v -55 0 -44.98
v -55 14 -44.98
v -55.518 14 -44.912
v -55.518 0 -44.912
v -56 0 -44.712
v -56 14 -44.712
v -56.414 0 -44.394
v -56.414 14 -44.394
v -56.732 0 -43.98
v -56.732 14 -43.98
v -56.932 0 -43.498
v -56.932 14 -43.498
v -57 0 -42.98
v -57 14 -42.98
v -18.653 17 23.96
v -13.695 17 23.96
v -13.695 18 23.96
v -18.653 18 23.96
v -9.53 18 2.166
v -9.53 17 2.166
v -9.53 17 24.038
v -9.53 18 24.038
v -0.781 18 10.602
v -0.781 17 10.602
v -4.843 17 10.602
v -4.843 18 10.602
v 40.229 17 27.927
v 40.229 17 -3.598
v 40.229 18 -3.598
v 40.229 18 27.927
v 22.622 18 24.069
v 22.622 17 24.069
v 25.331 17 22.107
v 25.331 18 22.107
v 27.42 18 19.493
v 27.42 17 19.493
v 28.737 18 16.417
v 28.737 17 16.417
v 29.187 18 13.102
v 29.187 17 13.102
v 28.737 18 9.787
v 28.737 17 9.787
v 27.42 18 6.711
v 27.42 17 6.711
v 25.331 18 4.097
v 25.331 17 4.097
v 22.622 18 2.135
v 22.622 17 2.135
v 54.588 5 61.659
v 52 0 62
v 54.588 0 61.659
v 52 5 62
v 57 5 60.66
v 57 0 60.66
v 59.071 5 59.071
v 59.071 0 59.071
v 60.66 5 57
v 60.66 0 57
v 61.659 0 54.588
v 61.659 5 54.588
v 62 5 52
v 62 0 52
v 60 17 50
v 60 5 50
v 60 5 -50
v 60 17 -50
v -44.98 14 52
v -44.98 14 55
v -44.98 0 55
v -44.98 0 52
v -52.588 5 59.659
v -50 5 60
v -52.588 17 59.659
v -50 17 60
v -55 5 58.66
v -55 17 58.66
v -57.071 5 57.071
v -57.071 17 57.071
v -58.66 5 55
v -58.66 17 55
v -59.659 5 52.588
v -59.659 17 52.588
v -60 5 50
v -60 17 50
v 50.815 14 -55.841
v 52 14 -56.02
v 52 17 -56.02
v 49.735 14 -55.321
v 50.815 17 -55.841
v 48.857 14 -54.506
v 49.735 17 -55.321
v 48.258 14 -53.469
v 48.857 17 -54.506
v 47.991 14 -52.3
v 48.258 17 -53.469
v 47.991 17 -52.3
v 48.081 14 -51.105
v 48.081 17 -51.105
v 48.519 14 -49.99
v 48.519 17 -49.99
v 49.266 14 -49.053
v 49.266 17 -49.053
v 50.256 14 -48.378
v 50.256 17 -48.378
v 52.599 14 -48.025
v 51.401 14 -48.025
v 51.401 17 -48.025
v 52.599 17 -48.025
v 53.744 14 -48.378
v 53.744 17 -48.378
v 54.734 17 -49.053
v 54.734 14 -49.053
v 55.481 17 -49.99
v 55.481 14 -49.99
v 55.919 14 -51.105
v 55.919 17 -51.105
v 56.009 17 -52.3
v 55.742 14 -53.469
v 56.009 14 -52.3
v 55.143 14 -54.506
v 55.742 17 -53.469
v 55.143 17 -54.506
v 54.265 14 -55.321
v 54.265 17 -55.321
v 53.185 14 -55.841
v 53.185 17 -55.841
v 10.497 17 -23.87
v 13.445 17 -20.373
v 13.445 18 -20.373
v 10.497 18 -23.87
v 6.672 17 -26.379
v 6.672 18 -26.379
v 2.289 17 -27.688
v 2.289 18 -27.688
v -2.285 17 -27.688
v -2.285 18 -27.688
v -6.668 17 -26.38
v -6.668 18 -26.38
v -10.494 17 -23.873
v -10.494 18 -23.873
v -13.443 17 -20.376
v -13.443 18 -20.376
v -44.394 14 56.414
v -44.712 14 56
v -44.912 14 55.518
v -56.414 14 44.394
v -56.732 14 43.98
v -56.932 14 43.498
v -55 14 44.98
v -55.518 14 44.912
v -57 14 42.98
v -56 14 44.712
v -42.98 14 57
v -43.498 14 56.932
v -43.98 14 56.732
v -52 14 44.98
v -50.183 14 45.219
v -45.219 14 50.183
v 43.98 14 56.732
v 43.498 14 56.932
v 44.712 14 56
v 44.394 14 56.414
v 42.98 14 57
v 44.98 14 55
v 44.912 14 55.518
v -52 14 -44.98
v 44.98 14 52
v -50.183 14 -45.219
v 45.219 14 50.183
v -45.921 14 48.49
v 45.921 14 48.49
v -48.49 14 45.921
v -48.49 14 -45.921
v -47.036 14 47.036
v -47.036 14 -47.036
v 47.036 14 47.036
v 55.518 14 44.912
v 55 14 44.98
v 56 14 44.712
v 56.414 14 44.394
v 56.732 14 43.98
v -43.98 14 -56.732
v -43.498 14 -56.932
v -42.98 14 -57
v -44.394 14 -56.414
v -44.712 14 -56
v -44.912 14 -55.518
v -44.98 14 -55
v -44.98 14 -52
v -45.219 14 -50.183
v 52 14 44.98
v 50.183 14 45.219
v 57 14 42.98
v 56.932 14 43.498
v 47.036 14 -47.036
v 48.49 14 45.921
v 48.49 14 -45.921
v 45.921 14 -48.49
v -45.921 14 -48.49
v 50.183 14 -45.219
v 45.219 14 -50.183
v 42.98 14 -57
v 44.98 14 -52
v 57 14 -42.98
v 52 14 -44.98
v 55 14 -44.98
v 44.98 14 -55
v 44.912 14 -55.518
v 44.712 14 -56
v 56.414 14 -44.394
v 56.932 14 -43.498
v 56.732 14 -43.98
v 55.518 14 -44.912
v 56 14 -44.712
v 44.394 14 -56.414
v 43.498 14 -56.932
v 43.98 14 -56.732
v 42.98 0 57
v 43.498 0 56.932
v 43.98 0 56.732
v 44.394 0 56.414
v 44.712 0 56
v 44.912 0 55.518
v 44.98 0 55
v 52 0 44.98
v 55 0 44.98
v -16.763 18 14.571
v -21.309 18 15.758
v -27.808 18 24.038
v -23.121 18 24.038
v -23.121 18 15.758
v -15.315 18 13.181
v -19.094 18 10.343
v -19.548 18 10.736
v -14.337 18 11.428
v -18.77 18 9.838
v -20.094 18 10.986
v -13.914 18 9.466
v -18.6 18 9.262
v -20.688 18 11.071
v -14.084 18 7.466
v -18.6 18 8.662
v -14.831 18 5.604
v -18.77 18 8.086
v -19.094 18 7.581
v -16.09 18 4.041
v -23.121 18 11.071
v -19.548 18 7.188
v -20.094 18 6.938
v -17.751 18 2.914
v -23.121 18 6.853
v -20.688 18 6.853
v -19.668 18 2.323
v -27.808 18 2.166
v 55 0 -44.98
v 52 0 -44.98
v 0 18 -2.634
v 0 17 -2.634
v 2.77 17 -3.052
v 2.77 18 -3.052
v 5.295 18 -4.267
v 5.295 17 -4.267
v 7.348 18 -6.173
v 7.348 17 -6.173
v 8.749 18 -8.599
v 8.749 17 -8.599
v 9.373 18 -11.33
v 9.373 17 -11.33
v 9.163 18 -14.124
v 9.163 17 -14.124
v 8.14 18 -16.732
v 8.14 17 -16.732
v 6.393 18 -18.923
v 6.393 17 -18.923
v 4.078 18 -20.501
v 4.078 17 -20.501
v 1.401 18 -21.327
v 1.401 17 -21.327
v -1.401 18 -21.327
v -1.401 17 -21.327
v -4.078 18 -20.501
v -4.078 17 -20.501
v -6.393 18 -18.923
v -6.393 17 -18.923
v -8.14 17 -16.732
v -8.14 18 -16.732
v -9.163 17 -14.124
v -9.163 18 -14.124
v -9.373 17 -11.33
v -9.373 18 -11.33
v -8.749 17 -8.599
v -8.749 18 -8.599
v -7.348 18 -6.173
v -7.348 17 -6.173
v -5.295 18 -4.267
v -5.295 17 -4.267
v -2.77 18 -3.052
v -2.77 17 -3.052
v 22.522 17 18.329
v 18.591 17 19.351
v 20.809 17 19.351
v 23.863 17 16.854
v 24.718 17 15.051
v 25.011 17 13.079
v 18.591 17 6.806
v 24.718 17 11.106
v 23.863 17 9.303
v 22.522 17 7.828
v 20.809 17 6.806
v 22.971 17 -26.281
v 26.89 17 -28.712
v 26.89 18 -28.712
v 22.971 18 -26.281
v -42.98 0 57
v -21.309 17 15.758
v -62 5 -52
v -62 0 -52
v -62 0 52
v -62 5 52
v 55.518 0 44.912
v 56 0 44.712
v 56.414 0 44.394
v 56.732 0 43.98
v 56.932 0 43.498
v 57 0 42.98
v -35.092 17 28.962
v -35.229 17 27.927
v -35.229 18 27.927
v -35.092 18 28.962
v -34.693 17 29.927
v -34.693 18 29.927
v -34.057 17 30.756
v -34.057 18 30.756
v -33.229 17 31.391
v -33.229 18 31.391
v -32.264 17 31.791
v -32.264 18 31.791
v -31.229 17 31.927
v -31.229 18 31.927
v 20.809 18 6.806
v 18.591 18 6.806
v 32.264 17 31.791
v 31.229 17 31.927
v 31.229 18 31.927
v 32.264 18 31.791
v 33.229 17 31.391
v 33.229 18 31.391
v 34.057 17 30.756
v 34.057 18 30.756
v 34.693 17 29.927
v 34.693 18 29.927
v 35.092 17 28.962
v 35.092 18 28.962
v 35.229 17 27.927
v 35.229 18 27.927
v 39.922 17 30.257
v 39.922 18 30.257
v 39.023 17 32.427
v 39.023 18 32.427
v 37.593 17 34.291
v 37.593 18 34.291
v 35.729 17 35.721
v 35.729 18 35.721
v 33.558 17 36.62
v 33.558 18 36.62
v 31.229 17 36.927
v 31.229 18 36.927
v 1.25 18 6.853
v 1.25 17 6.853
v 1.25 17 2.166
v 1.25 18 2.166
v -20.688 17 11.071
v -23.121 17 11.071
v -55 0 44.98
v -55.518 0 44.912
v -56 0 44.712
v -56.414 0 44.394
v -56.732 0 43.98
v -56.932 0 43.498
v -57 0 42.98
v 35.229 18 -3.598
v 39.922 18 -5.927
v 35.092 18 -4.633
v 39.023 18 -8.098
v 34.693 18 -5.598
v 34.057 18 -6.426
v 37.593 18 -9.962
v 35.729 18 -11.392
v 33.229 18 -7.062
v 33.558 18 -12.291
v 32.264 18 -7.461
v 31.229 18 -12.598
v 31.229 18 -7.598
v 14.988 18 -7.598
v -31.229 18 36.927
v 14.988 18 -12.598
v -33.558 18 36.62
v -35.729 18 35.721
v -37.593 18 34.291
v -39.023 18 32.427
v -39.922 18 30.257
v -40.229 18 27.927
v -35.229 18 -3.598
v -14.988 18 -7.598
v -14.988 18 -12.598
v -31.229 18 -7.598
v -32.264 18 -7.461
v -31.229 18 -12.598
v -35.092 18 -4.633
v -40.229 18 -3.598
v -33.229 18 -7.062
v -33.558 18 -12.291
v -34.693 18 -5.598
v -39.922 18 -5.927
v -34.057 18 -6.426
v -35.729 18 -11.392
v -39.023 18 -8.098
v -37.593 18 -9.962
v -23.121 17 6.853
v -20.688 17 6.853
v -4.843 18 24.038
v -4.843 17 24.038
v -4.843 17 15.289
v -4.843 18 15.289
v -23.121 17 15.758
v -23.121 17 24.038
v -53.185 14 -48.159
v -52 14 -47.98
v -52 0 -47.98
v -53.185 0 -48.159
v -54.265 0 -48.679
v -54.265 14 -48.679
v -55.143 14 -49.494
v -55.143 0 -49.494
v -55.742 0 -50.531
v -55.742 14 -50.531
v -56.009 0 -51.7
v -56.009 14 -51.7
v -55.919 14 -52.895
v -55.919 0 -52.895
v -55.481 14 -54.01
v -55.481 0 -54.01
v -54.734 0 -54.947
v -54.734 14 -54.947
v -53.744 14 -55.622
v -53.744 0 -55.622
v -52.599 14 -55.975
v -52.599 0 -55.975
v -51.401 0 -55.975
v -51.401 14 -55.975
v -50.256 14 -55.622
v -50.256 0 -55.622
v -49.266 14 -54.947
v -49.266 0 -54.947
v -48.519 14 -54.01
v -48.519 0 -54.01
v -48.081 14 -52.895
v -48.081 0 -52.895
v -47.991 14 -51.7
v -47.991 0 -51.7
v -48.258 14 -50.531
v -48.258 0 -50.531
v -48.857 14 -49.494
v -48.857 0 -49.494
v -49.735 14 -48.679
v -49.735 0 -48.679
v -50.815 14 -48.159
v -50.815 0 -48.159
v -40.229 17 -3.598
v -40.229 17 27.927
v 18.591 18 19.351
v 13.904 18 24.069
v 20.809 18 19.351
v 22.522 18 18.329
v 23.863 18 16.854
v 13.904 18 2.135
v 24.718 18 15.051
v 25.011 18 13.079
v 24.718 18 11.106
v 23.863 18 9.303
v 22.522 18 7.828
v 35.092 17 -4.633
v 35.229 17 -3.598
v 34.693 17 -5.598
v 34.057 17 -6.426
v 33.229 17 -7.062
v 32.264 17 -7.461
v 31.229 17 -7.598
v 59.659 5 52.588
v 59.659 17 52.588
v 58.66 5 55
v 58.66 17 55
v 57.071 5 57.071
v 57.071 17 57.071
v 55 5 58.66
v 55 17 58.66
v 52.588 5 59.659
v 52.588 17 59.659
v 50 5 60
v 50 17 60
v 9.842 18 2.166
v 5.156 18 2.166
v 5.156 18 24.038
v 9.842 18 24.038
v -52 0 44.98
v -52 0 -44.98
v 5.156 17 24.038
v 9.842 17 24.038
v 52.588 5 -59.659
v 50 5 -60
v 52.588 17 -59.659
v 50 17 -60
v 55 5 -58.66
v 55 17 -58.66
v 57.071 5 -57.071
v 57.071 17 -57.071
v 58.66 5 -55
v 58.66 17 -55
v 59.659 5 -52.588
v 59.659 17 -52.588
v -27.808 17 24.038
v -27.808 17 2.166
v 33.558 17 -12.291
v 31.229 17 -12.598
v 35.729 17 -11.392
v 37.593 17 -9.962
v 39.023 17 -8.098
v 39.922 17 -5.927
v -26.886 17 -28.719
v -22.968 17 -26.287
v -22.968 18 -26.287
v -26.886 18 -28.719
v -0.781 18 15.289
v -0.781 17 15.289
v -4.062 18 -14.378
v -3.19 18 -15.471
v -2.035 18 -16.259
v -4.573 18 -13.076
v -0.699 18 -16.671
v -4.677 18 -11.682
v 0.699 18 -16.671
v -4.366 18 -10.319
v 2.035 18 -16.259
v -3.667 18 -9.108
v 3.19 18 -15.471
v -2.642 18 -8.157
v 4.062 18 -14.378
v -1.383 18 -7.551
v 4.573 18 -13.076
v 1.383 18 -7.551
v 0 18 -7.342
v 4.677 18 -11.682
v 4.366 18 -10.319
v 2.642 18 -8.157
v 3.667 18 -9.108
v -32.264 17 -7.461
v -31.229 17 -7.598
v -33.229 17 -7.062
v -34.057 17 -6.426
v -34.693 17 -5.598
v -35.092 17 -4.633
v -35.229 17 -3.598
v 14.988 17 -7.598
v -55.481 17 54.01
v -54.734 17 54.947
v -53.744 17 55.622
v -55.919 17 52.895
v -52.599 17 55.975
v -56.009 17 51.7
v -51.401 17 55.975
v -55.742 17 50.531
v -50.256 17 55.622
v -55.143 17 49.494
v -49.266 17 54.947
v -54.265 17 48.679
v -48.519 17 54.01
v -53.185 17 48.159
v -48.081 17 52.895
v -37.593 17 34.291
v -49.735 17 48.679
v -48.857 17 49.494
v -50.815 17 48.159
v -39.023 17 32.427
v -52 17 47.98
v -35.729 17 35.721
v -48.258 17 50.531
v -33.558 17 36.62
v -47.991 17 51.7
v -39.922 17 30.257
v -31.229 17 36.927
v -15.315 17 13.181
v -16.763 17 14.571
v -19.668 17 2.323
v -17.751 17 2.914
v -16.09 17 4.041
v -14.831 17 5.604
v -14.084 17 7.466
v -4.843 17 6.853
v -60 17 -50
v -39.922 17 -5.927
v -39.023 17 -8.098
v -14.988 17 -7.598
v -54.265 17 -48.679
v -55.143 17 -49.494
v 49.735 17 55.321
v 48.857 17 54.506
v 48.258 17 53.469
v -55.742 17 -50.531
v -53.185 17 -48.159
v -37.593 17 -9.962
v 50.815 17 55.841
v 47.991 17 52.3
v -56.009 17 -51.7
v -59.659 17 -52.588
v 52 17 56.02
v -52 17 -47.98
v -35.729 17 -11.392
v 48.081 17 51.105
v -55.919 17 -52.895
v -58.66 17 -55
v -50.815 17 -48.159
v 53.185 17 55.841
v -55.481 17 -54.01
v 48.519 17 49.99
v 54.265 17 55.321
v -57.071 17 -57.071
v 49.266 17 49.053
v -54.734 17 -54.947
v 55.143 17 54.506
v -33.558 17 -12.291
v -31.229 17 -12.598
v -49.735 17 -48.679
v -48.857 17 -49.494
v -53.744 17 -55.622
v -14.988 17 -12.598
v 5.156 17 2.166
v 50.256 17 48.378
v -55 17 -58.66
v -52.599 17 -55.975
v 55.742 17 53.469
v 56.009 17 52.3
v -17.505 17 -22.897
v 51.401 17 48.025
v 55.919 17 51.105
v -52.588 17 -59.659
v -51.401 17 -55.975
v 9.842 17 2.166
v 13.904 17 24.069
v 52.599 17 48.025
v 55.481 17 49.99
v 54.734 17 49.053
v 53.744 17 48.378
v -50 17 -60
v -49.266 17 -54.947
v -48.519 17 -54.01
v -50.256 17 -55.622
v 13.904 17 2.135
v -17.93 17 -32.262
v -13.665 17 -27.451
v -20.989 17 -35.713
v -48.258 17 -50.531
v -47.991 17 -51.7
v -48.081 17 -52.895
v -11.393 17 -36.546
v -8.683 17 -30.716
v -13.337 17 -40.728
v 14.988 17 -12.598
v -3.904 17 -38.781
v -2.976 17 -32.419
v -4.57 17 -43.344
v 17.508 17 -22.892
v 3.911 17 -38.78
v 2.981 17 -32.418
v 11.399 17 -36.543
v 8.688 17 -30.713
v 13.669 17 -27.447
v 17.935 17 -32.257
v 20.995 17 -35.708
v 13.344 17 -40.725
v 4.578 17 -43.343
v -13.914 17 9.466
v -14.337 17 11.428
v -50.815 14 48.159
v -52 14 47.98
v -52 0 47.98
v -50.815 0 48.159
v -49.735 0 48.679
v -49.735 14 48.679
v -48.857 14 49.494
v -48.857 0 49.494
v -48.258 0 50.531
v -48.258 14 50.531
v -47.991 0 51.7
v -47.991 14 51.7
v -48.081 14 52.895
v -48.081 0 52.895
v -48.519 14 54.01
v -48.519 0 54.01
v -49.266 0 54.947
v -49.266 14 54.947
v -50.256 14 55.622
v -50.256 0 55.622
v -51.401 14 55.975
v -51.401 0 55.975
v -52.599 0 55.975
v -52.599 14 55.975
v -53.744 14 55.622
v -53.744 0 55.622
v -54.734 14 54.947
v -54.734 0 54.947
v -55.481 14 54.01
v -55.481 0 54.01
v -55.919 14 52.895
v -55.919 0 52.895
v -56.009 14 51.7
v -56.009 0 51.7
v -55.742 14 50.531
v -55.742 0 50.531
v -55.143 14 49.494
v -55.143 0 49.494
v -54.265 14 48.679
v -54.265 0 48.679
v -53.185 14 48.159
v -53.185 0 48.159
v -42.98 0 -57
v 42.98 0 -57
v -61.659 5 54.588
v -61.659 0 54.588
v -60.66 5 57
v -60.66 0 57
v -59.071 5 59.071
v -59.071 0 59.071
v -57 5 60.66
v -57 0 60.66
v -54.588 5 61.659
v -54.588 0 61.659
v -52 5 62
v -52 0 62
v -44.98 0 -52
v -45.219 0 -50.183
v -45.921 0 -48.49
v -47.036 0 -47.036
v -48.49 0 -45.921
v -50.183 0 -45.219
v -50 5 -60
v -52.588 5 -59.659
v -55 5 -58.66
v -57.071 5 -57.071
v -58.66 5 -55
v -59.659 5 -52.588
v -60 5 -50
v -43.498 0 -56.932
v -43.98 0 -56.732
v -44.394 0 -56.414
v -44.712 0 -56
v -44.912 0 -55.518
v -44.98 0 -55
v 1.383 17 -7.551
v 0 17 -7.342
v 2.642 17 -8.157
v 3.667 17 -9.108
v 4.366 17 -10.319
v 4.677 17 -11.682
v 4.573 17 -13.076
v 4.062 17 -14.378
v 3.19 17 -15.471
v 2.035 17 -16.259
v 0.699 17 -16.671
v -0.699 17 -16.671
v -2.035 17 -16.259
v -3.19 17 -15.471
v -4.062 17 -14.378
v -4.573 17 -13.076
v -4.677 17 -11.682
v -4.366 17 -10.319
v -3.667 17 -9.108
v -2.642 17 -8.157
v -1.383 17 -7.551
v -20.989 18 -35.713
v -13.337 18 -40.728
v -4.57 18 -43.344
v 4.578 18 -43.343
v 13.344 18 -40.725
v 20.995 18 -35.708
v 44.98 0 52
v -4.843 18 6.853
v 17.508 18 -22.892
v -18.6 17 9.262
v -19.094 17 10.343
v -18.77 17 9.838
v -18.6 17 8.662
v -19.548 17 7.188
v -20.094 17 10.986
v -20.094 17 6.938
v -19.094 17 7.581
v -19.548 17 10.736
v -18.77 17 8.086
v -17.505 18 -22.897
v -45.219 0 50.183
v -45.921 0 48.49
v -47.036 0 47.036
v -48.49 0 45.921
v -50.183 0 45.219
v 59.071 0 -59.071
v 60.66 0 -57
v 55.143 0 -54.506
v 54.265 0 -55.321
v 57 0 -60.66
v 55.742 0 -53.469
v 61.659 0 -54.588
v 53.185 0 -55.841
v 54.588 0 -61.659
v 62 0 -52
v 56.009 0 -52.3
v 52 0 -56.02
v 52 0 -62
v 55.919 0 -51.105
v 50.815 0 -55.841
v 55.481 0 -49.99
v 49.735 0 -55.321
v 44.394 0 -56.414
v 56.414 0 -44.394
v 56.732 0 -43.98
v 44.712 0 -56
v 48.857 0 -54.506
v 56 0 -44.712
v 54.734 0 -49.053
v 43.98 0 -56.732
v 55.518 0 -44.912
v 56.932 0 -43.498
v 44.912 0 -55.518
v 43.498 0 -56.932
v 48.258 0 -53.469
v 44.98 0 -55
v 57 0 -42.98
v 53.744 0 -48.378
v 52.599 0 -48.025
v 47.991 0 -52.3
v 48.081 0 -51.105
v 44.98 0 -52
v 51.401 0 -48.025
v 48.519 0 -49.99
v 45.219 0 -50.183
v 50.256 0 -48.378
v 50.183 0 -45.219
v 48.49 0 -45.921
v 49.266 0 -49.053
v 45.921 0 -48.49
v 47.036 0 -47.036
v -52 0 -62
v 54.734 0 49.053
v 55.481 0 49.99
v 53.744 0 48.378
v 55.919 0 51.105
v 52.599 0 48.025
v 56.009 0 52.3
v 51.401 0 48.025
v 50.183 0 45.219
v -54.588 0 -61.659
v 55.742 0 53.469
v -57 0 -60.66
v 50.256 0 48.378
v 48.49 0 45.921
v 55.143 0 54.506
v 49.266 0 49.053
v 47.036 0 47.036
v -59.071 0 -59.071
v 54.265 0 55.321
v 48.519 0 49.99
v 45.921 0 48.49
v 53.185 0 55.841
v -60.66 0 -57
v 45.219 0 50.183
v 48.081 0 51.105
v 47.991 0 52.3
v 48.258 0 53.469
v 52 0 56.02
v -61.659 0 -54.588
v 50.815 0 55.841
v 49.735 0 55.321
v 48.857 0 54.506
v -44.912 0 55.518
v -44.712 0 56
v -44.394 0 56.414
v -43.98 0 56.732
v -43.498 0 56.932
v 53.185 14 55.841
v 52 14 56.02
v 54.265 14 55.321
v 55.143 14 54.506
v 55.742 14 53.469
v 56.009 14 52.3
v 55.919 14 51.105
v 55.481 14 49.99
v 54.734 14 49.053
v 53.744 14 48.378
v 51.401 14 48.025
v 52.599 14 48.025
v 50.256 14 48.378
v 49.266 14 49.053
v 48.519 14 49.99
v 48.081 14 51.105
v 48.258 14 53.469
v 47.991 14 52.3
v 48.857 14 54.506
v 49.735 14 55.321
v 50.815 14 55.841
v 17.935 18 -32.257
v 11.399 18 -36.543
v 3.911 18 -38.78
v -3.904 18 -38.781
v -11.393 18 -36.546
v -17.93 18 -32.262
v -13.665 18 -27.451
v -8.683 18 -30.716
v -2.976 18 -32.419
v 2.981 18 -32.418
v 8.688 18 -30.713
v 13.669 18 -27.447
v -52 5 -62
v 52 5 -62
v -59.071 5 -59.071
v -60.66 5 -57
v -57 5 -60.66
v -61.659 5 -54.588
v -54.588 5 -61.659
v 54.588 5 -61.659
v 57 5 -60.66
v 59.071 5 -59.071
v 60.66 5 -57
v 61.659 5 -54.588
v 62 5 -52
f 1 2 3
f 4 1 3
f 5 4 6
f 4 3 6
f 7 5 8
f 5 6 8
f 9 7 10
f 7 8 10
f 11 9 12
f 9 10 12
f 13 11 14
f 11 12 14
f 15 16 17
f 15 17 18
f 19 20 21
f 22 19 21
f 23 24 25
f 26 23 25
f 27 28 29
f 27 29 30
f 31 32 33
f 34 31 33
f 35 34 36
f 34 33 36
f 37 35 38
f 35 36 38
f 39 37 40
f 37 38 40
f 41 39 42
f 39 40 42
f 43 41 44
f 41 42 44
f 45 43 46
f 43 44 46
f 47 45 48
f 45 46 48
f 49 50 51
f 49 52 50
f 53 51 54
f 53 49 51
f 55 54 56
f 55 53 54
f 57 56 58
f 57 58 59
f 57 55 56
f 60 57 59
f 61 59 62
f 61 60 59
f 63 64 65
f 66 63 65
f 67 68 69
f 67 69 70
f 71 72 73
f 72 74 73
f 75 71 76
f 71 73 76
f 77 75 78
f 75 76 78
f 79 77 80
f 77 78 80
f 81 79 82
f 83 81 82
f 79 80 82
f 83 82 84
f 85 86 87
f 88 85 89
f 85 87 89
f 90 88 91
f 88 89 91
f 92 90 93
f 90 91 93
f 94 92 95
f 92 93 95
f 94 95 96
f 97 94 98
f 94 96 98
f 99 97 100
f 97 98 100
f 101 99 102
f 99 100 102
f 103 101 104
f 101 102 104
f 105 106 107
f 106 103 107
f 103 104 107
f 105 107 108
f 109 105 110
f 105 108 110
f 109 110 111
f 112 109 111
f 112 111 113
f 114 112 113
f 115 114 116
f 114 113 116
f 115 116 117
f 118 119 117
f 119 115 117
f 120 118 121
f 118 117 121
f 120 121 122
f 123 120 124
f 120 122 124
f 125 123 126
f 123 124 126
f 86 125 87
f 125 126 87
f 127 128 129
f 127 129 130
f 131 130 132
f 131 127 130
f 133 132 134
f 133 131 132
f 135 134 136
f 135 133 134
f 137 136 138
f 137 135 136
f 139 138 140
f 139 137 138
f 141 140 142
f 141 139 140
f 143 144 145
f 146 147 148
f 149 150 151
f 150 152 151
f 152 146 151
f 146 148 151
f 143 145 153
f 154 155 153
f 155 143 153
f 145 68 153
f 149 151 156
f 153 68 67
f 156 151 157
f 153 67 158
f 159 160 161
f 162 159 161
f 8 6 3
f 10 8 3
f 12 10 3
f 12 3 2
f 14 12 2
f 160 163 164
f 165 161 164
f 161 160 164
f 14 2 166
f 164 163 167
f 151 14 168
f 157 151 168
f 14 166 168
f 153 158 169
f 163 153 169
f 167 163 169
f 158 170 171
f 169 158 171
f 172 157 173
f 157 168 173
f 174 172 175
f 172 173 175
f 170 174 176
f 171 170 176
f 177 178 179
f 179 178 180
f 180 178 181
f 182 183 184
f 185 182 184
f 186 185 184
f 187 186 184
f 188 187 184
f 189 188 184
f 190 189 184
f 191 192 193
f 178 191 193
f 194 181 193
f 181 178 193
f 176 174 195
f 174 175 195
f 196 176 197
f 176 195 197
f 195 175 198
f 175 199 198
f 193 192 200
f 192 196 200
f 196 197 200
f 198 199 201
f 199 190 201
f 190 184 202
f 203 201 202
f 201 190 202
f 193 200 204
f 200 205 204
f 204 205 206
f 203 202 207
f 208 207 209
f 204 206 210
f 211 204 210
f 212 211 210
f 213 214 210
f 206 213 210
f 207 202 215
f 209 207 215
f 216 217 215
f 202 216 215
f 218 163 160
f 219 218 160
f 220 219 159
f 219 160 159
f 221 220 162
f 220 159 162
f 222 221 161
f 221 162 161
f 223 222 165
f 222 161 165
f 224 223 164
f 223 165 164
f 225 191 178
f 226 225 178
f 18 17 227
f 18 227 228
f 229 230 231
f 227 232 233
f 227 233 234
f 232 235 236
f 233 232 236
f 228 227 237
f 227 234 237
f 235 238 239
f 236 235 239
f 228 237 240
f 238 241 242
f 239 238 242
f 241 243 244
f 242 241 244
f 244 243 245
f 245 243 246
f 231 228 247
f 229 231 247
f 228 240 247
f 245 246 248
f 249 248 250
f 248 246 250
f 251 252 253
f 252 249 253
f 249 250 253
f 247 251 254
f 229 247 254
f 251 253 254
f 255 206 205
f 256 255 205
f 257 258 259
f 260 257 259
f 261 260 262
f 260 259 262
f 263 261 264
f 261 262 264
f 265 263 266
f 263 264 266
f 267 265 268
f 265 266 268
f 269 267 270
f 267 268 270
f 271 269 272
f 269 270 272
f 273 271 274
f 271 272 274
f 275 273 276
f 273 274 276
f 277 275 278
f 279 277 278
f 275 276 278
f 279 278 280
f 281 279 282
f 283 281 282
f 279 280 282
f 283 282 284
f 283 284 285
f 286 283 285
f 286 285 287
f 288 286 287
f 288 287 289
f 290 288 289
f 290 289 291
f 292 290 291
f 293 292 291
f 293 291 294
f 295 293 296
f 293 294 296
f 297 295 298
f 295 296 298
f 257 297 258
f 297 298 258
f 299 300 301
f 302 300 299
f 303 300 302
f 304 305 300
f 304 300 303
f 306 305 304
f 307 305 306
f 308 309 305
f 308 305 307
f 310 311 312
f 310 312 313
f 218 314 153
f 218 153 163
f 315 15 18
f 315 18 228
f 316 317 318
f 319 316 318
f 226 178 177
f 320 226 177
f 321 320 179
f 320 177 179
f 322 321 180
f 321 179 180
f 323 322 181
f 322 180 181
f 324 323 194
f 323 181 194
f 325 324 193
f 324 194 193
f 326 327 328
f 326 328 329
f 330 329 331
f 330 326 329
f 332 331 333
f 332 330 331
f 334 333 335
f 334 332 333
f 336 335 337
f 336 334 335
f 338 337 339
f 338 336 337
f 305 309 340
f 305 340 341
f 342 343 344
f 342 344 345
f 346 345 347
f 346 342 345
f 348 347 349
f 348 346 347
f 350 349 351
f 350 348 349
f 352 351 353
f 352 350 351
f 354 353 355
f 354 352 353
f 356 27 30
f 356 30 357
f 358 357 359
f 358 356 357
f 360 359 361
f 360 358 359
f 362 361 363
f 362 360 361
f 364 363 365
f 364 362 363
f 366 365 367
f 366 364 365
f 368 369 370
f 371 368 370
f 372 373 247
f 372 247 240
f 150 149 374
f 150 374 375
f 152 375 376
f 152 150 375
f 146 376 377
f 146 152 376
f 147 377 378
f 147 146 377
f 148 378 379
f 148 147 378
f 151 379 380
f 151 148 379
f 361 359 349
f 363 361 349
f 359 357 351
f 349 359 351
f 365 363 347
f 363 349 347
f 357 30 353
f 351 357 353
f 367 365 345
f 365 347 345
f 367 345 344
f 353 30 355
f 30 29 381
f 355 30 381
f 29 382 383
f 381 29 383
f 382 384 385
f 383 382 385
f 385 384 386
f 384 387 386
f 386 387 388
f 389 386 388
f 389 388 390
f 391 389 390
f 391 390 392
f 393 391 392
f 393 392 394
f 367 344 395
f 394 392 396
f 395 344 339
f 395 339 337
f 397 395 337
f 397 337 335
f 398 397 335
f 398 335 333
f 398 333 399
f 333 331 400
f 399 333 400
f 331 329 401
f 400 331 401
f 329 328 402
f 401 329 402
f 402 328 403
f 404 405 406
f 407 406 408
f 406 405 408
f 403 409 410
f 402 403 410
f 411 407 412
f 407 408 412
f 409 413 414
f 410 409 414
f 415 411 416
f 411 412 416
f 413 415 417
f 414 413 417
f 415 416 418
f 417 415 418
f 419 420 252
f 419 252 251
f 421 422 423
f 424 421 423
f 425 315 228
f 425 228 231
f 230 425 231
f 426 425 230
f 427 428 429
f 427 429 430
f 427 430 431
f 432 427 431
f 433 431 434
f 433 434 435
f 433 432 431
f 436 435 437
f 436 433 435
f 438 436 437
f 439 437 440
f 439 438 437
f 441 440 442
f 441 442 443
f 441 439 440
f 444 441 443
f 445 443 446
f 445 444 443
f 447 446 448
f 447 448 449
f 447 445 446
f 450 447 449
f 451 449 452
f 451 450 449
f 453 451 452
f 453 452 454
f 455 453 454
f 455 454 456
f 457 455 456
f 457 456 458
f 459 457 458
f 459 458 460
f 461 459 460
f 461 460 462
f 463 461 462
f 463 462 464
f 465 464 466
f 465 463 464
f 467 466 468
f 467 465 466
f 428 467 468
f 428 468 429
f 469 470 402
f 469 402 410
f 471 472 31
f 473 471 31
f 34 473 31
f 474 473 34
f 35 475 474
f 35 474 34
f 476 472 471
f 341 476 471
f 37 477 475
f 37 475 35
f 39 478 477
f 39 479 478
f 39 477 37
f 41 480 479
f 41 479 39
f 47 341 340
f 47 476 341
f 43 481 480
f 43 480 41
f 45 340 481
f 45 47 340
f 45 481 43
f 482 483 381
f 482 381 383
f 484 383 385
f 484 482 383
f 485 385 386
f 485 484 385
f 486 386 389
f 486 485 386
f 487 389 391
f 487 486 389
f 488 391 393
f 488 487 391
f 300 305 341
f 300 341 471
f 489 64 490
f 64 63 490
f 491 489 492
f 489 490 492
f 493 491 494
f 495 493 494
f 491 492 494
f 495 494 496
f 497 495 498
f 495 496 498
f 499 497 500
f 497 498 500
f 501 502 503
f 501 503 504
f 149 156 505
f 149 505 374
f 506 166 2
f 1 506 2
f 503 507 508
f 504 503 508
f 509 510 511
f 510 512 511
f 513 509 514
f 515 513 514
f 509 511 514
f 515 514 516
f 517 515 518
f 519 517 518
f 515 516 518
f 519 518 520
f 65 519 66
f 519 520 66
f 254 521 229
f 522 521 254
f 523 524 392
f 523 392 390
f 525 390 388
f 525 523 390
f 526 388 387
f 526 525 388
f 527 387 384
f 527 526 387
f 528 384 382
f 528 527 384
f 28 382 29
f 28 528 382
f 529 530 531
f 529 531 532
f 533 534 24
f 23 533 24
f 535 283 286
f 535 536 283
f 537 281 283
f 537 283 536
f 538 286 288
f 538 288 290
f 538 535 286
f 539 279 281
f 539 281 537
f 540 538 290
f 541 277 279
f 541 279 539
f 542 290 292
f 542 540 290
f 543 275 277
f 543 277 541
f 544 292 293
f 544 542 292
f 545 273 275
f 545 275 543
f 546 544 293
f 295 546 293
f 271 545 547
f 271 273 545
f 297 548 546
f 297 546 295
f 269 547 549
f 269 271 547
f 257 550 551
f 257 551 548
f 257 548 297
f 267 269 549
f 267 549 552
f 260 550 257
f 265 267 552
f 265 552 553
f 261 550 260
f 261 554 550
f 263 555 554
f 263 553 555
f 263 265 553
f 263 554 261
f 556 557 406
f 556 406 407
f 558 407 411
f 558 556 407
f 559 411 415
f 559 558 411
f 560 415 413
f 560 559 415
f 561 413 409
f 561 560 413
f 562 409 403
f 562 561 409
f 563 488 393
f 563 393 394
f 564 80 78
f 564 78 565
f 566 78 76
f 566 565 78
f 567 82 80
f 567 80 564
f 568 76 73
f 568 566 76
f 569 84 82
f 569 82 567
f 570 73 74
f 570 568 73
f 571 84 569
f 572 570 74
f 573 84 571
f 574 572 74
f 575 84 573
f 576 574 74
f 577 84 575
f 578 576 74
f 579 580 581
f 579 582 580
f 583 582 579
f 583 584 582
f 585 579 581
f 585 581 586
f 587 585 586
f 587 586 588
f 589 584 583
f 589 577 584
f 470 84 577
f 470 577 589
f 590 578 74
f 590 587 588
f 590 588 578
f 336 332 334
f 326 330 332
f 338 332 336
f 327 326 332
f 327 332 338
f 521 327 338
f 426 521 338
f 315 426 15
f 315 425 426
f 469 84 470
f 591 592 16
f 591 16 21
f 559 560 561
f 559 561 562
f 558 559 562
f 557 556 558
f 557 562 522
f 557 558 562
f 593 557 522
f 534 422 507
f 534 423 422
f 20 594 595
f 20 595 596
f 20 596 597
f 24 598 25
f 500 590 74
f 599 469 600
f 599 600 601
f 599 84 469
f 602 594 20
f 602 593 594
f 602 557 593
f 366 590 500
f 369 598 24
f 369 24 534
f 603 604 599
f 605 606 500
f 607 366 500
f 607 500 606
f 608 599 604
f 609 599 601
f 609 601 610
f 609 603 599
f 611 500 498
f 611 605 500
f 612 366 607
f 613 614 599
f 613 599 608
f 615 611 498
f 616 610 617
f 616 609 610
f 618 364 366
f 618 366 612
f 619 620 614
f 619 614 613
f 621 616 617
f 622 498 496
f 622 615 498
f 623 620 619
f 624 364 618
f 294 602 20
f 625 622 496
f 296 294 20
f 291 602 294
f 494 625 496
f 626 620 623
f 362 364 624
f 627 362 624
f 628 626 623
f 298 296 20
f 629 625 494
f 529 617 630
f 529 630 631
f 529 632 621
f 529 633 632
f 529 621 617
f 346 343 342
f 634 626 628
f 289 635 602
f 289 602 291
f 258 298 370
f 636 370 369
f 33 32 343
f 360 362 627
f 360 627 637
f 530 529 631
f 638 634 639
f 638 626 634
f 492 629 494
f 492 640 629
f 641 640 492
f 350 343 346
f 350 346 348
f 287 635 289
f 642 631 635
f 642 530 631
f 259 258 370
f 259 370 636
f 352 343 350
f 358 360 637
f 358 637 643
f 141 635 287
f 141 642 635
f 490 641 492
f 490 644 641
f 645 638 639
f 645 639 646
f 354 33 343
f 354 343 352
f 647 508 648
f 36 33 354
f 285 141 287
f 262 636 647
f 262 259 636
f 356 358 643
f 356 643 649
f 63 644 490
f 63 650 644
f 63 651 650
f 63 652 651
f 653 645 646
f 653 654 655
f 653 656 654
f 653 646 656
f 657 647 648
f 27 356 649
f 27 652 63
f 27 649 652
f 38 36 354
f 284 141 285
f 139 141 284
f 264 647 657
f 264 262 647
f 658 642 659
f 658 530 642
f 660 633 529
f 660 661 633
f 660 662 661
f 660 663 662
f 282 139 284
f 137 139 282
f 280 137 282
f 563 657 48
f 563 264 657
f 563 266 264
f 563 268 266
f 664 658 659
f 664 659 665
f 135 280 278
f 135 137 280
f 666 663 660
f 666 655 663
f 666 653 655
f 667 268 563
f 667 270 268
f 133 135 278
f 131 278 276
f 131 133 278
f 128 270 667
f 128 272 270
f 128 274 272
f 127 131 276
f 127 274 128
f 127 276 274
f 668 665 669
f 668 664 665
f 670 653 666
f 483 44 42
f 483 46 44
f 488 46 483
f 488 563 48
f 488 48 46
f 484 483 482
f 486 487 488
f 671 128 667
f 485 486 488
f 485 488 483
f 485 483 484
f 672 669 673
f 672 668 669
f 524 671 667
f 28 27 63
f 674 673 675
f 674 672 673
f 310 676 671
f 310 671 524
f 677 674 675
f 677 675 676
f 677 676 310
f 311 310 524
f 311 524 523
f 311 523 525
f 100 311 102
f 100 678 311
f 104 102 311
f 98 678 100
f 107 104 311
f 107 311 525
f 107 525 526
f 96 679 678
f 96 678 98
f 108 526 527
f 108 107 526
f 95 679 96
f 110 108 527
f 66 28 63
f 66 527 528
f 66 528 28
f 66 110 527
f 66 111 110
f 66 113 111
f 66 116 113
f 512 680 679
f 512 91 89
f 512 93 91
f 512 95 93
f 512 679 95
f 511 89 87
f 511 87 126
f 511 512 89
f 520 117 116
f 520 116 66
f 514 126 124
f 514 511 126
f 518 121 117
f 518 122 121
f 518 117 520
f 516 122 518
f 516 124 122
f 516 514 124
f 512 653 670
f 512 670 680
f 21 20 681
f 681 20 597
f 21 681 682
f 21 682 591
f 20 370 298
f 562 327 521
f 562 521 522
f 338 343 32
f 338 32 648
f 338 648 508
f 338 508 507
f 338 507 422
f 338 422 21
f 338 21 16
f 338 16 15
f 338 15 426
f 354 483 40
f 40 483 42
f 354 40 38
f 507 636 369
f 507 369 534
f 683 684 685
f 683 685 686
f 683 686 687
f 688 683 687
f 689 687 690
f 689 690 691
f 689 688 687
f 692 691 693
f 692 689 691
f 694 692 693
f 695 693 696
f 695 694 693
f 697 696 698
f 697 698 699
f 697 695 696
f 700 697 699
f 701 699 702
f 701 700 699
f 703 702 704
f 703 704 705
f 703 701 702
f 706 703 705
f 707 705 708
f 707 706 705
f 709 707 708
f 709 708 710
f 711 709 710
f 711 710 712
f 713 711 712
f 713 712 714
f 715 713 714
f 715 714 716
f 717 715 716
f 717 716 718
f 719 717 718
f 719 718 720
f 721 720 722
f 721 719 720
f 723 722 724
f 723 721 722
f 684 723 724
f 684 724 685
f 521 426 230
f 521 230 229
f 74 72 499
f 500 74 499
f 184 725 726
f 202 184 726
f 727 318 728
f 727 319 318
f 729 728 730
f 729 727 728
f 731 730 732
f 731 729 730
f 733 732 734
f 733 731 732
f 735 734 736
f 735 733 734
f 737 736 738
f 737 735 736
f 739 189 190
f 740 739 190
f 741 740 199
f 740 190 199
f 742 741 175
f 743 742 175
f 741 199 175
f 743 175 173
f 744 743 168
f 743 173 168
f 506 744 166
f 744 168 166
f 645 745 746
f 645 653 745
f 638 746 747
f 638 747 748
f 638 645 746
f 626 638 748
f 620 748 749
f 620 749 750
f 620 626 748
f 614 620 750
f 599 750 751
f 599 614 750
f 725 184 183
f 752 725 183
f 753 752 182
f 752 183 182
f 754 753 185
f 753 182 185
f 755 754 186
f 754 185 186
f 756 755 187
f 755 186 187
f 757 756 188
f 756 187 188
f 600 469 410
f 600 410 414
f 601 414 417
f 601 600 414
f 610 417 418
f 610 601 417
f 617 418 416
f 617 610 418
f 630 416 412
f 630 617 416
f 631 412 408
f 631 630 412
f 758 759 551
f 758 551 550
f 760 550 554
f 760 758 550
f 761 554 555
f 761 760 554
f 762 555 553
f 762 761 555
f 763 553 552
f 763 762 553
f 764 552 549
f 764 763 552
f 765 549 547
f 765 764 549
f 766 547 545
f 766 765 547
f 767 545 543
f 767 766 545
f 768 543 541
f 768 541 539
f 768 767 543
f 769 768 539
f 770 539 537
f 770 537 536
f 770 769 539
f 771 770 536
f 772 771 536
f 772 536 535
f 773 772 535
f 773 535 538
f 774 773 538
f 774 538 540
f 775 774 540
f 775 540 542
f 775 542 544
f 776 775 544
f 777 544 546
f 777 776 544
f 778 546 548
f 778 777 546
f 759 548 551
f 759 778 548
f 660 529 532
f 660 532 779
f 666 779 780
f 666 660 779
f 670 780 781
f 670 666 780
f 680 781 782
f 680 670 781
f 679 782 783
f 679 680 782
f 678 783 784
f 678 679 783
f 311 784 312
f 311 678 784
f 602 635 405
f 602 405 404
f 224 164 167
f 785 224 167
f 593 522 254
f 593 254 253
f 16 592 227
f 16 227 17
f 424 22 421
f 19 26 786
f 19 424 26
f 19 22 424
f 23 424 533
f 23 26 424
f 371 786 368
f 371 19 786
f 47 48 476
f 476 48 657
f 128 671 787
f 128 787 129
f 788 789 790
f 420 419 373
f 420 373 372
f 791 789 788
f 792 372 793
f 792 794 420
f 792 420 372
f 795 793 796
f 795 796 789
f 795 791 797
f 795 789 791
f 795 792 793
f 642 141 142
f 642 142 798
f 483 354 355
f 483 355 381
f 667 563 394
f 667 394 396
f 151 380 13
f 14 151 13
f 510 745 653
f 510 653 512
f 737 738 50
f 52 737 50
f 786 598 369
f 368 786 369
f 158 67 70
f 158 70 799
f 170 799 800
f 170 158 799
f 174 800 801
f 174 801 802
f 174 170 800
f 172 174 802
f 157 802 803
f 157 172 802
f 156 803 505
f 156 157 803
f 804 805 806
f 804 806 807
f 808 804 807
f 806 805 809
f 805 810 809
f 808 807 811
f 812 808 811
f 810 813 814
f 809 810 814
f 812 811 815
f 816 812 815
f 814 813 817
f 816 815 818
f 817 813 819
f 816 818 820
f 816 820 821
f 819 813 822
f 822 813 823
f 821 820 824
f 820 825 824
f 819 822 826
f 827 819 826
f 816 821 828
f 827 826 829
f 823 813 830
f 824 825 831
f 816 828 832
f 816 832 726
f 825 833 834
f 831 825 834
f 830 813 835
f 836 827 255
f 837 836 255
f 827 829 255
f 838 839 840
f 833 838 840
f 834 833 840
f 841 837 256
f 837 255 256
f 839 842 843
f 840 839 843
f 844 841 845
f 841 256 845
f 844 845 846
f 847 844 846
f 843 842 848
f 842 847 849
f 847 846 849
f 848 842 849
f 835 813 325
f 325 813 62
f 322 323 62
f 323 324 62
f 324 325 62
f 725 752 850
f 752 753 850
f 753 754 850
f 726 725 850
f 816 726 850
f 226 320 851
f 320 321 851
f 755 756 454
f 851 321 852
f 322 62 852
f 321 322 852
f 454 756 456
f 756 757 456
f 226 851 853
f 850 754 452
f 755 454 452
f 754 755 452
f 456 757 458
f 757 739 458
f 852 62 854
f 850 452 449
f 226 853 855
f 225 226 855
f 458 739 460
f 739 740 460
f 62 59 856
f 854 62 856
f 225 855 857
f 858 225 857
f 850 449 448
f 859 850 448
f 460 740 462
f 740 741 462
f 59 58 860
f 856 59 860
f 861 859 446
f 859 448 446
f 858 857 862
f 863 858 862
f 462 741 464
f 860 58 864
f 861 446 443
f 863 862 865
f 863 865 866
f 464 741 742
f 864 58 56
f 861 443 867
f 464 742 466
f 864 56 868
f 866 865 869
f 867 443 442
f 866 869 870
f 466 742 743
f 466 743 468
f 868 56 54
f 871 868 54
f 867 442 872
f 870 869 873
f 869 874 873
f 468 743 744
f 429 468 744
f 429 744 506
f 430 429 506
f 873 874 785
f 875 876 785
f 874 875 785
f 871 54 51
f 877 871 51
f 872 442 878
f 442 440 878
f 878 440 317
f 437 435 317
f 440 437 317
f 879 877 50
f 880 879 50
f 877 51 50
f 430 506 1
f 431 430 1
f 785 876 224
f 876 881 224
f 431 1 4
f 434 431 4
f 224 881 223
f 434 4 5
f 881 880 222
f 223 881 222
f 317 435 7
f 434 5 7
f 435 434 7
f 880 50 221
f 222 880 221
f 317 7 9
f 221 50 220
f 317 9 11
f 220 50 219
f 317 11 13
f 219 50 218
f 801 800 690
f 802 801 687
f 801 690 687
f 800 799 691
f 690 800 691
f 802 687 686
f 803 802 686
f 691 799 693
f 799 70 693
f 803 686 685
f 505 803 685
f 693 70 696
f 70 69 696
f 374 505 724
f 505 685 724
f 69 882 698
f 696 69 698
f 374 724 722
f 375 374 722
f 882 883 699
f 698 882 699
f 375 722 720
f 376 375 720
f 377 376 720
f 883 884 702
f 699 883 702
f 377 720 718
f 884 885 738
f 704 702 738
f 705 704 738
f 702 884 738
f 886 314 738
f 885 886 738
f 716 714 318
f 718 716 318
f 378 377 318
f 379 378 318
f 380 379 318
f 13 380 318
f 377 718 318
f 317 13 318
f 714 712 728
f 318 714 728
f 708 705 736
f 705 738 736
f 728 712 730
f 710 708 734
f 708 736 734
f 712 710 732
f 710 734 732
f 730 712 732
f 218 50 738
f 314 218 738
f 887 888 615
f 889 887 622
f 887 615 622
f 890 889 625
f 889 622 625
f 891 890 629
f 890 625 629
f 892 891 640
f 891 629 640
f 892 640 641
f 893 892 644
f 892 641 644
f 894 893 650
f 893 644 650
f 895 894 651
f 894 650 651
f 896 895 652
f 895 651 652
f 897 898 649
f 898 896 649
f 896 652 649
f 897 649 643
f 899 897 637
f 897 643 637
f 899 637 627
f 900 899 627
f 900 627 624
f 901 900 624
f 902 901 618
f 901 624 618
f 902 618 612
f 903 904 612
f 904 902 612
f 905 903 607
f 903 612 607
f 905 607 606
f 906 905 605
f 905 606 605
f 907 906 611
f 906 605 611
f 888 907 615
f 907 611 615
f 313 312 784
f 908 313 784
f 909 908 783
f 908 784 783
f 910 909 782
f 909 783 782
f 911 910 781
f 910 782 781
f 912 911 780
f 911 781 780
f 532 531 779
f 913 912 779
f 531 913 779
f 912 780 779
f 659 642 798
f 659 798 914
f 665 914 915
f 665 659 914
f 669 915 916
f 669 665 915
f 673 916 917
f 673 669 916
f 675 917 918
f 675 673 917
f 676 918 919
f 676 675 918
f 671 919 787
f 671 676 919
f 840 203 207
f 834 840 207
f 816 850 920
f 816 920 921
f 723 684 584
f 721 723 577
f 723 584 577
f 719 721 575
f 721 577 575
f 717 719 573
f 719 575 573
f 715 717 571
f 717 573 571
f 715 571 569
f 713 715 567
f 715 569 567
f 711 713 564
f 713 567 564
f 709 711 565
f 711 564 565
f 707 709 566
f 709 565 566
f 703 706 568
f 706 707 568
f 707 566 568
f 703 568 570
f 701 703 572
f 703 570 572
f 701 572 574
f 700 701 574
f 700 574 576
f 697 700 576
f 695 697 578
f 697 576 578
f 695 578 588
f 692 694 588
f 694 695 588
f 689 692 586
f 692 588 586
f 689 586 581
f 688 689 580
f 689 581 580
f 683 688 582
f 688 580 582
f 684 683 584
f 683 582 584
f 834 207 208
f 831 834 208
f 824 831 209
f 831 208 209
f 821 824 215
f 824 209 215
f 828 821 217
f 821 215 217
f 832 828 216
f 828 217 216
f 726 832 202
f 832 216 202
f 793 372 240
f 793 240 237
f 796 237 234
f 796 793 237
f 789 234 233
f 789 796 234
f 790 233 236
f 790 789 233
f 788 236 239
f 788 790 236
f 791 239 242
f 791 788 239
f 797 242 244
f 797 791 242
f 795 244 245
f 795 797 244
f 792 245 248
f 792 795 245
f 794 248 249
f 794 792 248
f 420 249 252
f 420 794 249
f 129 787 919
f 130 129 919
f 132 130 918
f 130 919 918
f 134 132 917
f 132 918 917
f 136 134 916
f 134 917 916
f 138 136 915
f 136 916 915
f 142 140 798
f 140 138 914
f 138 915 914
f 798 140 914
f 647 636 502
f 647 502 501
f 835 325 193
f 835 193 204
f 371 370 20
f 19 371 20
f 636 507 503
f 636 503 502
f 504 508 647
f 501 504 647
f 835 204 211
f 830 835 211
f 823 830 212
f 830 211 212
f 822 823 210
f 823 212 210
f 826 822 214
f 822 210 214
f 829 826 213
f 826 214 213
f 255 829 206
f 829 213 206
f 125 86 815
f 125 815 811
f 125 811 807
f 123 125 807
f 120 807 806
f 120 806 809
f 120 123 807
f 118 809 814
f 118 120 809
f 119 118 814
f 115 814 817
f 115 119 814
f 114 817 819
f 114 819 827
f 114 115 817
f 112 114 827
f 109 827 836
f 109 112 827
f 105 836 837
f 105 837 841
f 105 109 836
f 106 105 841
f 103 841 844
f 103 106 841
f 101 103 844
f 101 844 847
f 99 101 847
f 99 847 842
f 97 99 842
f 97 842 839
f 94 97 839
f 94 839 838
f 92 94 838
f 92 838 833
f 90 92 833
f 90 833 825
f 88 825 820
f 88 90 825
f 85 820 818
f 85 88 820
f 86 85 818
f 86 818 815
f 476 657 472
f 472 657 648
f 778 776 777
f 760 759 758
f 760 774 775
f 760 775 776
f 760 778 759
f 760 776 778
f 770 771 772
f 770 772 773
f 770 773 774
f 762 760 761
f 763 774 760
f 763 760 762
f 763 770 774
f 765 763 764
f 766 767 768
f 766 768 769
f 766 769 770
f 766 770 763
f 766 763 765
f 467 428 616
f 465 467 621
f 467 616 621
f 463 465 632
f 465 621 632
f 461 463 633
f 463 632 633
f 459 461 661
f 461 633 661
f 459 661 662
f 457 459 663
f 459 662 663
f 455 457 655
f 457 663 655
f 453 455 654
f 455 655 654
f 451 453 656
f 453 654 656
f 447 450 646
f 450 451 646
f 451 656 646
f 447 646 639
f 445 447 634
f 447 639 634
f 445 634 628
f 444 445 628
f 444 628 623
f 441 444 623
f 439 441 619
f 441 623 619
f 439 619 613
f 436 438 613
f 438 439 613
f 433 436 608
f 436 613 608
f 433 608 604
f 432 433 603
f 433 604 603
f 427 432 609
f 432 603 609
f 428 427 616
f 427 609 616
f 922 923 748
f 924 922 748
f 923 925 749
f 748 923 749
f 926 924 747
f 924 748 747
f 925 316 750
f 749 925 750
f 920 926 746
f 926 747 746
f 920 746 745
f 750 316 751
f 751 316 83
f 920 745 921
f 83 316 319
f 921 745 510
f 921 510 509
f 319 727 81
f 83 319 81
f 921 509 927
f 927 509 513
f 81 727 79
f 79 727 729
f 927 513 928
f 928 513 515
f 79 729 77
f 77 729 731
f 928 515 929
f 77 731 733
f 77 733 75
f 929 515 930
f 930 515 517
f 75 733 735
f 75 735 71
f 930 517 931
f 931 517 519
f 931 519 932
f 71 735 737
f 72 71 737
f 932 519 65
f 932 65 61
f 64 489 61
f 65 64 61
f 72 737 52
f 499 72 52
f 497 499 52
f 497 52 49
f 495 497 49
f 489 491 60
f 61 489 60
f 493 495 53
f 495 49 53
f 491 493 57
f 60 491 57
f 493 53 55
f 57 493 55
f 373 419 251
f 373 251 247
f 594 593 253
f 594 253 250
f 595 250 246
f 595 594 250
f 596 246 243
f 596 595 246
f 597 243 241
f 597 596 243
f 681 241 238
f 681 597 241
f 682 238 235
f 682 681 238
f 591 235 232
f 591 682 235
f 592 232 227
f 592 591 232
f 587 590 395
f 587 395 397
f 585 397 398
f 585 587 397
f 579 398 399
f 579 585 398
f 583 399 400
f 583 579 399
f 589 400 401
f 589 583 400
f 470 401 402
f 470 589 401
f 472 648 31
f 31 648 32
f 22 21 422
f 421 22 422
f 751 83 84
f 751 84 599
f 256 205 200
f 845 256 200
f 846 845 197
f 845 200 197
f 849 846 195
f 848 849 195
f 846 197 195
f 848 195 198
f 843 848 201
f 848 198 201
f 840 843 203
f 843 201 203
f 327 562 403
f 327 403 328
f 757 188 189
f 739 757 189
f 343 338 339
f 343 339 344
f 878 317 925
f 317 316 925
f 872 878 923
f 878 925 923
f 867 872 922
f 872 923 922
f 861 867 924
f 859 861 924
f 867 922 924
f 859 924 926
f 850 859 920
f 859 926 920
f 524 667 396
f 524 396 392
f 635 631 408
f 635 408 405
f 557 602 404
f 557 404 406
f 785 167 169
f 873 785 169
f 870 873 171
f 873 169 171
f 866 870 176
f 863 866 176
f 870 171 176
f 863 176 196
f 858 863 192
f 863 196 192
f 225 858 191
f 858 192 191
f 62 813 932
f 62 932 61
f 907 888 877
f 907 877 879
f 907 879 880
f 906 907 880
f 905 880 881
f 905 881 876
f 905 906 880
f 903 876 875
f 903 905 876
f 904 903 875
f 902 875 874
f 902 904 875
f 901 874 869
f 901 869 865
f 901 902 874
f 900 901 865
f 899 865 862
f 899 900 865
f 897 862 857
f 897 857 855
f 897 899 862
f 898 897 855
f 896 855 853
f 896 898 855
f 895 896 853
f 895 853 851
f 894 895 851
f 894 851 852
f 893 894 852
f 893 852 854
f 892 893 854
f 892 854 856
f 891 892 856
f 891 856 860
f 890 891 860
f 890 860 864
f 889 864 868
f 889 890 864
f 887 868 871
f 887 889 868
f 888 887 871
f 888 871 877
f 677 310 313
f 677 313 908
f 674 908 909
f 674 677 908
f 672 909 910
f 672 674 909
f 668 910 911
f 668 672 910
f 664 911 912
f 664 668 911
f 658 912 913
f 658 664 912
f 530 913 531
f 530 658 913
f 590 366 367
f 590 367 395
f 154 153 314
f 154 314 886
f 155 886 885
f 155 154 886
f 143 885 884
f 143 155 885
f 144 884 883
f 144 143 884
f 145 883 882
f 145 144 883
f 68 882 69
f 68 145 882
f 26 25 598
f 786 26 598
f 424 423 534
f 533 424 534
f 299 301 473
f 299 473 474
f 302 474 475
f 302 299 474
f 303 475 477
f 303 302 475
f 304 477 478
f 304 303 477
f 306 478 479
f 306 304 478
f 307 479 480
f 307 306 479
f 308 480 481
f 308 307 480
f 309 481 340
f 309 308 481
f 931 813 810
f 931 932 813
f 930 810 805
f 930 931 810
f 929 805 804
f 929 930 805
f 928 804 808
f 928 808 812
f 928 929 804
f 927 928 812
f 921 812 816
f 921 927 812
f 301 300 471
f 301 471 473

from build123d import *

# Parameters (mm, degrees)
SKETCH1_W           = 120
SKETCH1_H           = 120
BOSS_EXTRUDE1_DEPTH = 17
SHELL1_T            = -3
SKETCH2_W           = 124
SKETCH2_H           = 124
SKETCH2_W_2         = 120
SKETCH2_H_2         = 120
BOSS_EXTRUDE2_DEPTH = 5
SKETCH4_R           = 4.02
BOSS_EXTRUDE3_DEPTH = 14
SKETCH3_R           = 4.02
CUT_EXTRUDE1_DEPTH  = 3
FILLET1_R           = 10
SKETCH9_R           = 9.39878502
SKETCH9_R_2         = 4.690586007
SKETCH9_W           = 4.6868
SKETCH9_H           = 21.8714
BOSS_EXTRUDE7_DEPTH = 1


with BuildPart() as part:
    # Sketch1 → Boss-Extrude1 (new body)
    with BuildSketch(Plane(origin=(0, 0, 0), x_dir=(1, 0, 0), z_dir=(0, 1, 0))):
        Rectangle(SKETCH1_W, SKETCH1_H)
    extrude(amount=BOSS_EXTRUDE1_DEPTH)

    # Shell1
    shell1_openings = [part.faces().sort_by_distance(p)[0] for p in [
        (0, 0, 0),
    ]]
    offset(amount=SHELL1_T, openings=shell1_openings, kind=Kind.INTERSECTION)

    # Sketch2 → Boss-Extrude2 (add)
    with BuildSketch(Plane.XZ):
        Rectangle(SKETCH2_W, SKETCH2_H)
        Rectangle(SKETCH2_W_2, SKETCH2_H_2, mode=Mode.SUBTRACT)
    extrude(amount=-BOSS_EXTRUDE2_DEPTH)

    # Sketch4 → Boss-Extrude3 (add)
    # profile 1 of 4: a face of its own
    with BuildSketch(Plane.XZ.offset(-14)):
        with BuildLine():
            Line((-57, 42.98), (-57, 57))
            Line((-57, 57), (-42.98, 57))
            ThreePointArc((-42.98, 57), (-44.394213562, 56.414213562), (-44.98, 55))
            Line((-44.98, 55), (-44.98, 52))
            ThreePointArc((-44.98, 52), (-47.036110396, 47.036110396), (-52, 44.98))
            Line((-52, 44.98), (-55, 44.98))
            ThreePointArc((-55, 44.98), (-56.414213562, 44.394213562), (-57, 42.98))
        make_face()
        with Locations(Location((-52, 52, 0), (0, 0, 270))):
            Circle(SKETCH4_R, mode=Mode.SUBTRACT)
    # profile 2 of 4: a face of its own
    with BuildSketch(Plane.XZ.offset(-14)):
        with BuildLine():
            Line((57, 42.98), (57, 57))
            Line((57, 57), (42.98, 57))
            ThreePointArc((42.98, 57), (44.394213562, 56.414213562), (44.98, 55))
            Line((44.98, 55), (44.98, 52))
            ThreePointArc((44.98, 52), (47.036110396, 47.036110396), (52, 44.98))
            Line((52, 44.98), (55, 44.98))
            ThreePointArc((55, 44.98), (56.414213562, 44.394213562), (57, 42.98))
        make_face()
        with Locations(Location((52, 52, 0), (0, 0, 90))):
            Circle(SKETCH4_R, mode=Mode.SUBTRACT)
    # profile 3 of 4: a face of its own
    with BuildSketch(Plane.XZ.offset(-14)):
        with BuildLine():
            Line((55, -44.98), (52, -44.98))
            ThreePointArc((52, -44.98), (47.036110396, -47.036110396), (44.98, -52))
            Line((44.98, -52), (44.98, -55))
            ThreePointArc((44.98, -55), (44.394213562, -56.414213562), (42.98, -57))
            Line((42.98, -57), (57, -57))
            Line((57, -57), (57, -42.98))
            ThreePointArc((57, -42.98), (56.414213562, -44.394213562), (55, -44.98))
        make_face()
        with Locations(Location((52, -52, 0), (0, 0, 270))):
            Circle(SKETCH4_R, mode=Mode.SUBTRACT)
    # profile 4 of 4: a face of its own
    with BuildSketch(Plane.XZ.offset(-14)):
        with BuildLine():
            Line((-57, -42.98), (-57, -57))
            Line((-57, -57), (-42.98, -57))
            ThreePointArc((-42.98, -57), (-44.394213562, -56.414213562), (-44.98, -55))
            Line((-44.98, -55), (-44.98, -52))
            ThreePointArc((-44.98, -52), (-47.036110396, -47.036110396), (-52, -44.98))
            Line((-52, -44.98), (-55, -44.98))
            ThreePointArc((-55, -44.98), (-56.414213562, -44.394213562), (-57, -42.98))
        make_face()
        with Locations(Location((-52, -52, 0), (0, 0, 90))):
            Circle(SKETCH4_R, mode=Mode.SUBTRACT)
    extrude(amount=BOSS_EXTRUDE3_DEPTH)

    # Sketch3 → Cut-Extrude1 (cut)
    with BuildSketch(Plane(origin=(0, 17, 0), x_dir=(1, 0, 0), z_dir=(0, 1, 0))):
        with Locations(Location((-52, 52, 0), (0, 0, 270))):
            Circle(SKETCH3_R)
        with Locations(Location((52, 52, 0), (0, 0, 90))):
            Circle(SKETCH3_R)
        with Locations(Location((52, -52, 0), (0, 0, 270))):
            Circle(SKETCH3_R)
        with Locations(Location((-52, -52, 0), (0, 0, 90))):
            Circle(SKETCH3_R)
    extrude(amount=-CUT_EXTRUDE1_DEPTH, mode=Mode.SUBTRACT)

    # Fillet1
    fillet1_edges = [part.edges().sort_by_distance(p)[0] for p in [
        (62, 2.5, -62),
        (-62, 2.5, -62),
        (-62, 2.5, 62),
        (62, 2.5, 62),
        (60, 11, 60),
        (-60, 11, 60),
        (-60, 11, -60),
        (60, 11, -60),
    ]]
    fillet(fillet1_edges, radius=FILLET1_R)

    # Sketch9 → Boss-Extrude7 (add)
    # profile 1 of 8: a face of its own
    with BuildSketch(Plane(origin=(0, 17, 0), x_dir=(1, 0, 0), z_dir=(0, 1, 0))):
        with Locations(Location((0, 12.032739488, 0), (0, 0, 270))):
            Circle(SKETCH9_R)
        with Locations(Location((0, 12.032739488, 0), (0, 0, 270))):
            Circle(SKETCH9_R_2, mode=Mode.SUBTRACT)
    # profile 2 of 8: a face of its own
    with BuildSketch(Plane(origin=(0, 17, 0), x_dir=(1, 0, 0), z_dir=(0, 1, 0))):
        with BuildLine():
            Line((-13.44305, 20.375947386), (-17.50480026, 22.896805886))
            ThreePointArc((-17.50480026, 22.896805886), (0.002640651, 32.634825883), (17.507584665, 22.892318209))
            Line((17.507584665, 22.892318209), (13.445188322, 20.372501014))
            ThreePointArc((13.445188322, 20.372501014), (0.002027924, 27.854392601), (-13.44305, 20.375947386))
        make_face()
    # profile 3 of 8: a face of its own
    with BuildSketch(Plane(origin=(0, 17, 0), x_dir=(1, 0, 0), z_dir=(0, 1, 0))):
        with BuildLine():
            Line((-40.2286, -27.927144715), (-40.2286, 3.597555285))
            ThreePointArc((-40.2286, 3.597555285), (-37.592561031, 9.961516315), (-31.2286, 12.597555285))
            Line((-31.2286, 12.597555285), (-14.988446655, 12.597555285))
            Line((-14.988446655, 12.597555285), (-14.988446655, 7.597555285))
            Line((-14.988446655, 7.597555285), (-31.2286, 7.597555285))
            ThreePointArc((-31.2286, 7.597555285), (-34.057027125, 6.42598241), (-35.2286, 3.597555285))
            Line((-35.2286, 3.597555285), (-35.2286, -27.927144715))
            ThreePointArc((-35.2286, -27.927144715), (-34.057027125, -30.75557184), (-31.2286, -31.927144715))
            Line((-31.2286, -31.927144715), (31.2286, -31.927144715))
            ThreePointArc((31.2286, -31.927144715), (34.057027125, -30.75557184), (35.2286, -27.927144715))
            Line((35.2286, -27.927144715), (35.2286, 3.597555285))
            ThreePointArc((35.2286, 3.597555285), (34.057027125, 6.42598241), (31.2286, 7.597555285))
            Line((31.2286, 7.597555285), (14.988446655, 7.597555285))
            Line((14.988446655, 7.597555285), (14.988446655, 12.597555285))
            Line((14.988446655, 12.597555285), (31.2286, 12.597555285))
            ThreePointArc((31.2286, 12.597555285), (37.592561031, 9.961516315), (40.2286, 3.597555285))
            Line((40.2286, 3.597555285), (40.2286, -27.927144715))
            ThreePointArc((40.2286, -27.927144715), (37.592561031, -34.291105746), (31.2286, -36.927144715))
            Line((31.2286, -36.927144715), (-31.2286, -36.927144715))
            ThreePointArc((-31.2286, -36.927144715), (-37.592561031, -34.291105746), (-40.2286, -27.927144715))
        make_face()
    # profile 4 of 8: a face of its own
    with BuildSketch(Plane(origin=(0, 17, 0), x_dir=(1, 0, 0), z_dir=(0, 1, 0))):
        with BuildLine():
            Line((-22.967626314, 26.287219035), (-26.8861, 28.719155285))
            ThreePointArc((-26.8861, 28.719155285), (0.004055848, 43.676045714), (26.890376645, 28.712262541))
            Line((26.890376645, 28.712262541), (22.971279665, 26.281330863))
            ThreePointArc((22.971279665, 26.281330863), (0.003464735, 39.064240253), (-22.967626314, 26.287219035))
        make_face()
    # profile 5 of 8: a face of its own
    with BuildSketch(Plane(origin=(0, 17, 0), x_dir=(1, 0, 0), z_dir=(0, 1, 0))):
        with BuildLine():
            Line((-27.8078, -24.037744715), (-27.8077, -2.166344715))
            Line((-27.8077, -2.166344715), (-19.6684, -2.322544715))
            ThreePointArc((-19.6684, -2.322544715), (-14.083780395, -7.46632893), (-16.7627, -14.570544715))
            Line((-16.7627, -14.570544715), (-13.694775607, -23.959644715))
            Line((-13.694775607, -23.959644715), (-18.653, -23.959644715))
            Line((-18.653, -23.959644715), (-21.3088, -15.757844715))
            Line((-21.3088, -15.757844715), (-23.121, -15.757844715))
            Line((-23.121, -15.757844715), (-23.121, -24.037744715))
            Line((-23.121, -24.037744715), (-27.8078, -24.037744715))
        make_face()
        with BuildLine():
            Line((-23.1211, -6.853044715), (-23.1211, -11.071144715))
            Line((-23.1211, -11.071144715), (-20.688080887, -11.071144715))
            ThreePointArc((-20.688080887, -11.071144715), (-18.579030887, -8.962094715), (-20.688080887, -6.853044715))
            Line((-20.688080887, -6.853044715), (-23.1211, -6.853044715))
        make_face(mode=Mode.SUBTRACT)
    # profile 6 of 8: a face of its own
    with BuildSketch(Plane(origin=(0, 17, 0), x_dir=(1, 0, 0), z_dir=(0, 1, 0))):
        Polygon((-9.5295, -2.166244715), (-9.5295, -24.037744715), (-4.8428, -24.037744715), (-4.8428, -15.289144715), (-0.781, -15.289144715), (-0.781, -10.602344715), (-4.8428, -10.602344715), (-4.8428, -6.853044715), (1.25, -6.853044715), (1.25, -2.166244715), align=None)
    # profile 7 of 8: a face of its own
    with BuildSketch(Plane(origin=(0, 17, 0), x_dir=(1, 0, 0), z_dir=(0, 1, 0))):
        with Locations((7.4989, -13.102044715)):
            Rectangle(SKETCH9_W, SKETCH9_H)
    # profile 8 of 8: a face of its own
    with BuildSketch(Plane(origin=(0, 17, 0), x_dir=(1, 0, 0), z_dir=(0, 1, 0))):
        with BuildLine():
            Line((13.904, -2.135144715), (13.904, -24.068944715))
            Line((13.904, -24.068944715), (22.62153415, -24.068944715))
            ThreePointArc((22.62153415, -24.068944715), (29.187351473, -13.102044715), (22.62153415, -2.135144715))
            Line((22.62153415, -2.135144715), (13.904, -2.135144715))
        make_face()
        with BuildLine():
            Line((18.5908, -6.806144715), (18.5908, -19.351044715))
            Line((18.5908, -19.351044715), (20.808626637, -19.351044715))
            ThreePointArc((20.808626637, -19.351044715), (25.011270759, -13.078594715), (20.808626637, -6.806144715))
            Line((20.808626637, -6.806144715), (18.5908, -6.806144715))
        make_face(mode=Mode.SUBTRACT)
    extrude(amount=BOSS_EXTRUDE7_DEPTH)


solid = part.part
